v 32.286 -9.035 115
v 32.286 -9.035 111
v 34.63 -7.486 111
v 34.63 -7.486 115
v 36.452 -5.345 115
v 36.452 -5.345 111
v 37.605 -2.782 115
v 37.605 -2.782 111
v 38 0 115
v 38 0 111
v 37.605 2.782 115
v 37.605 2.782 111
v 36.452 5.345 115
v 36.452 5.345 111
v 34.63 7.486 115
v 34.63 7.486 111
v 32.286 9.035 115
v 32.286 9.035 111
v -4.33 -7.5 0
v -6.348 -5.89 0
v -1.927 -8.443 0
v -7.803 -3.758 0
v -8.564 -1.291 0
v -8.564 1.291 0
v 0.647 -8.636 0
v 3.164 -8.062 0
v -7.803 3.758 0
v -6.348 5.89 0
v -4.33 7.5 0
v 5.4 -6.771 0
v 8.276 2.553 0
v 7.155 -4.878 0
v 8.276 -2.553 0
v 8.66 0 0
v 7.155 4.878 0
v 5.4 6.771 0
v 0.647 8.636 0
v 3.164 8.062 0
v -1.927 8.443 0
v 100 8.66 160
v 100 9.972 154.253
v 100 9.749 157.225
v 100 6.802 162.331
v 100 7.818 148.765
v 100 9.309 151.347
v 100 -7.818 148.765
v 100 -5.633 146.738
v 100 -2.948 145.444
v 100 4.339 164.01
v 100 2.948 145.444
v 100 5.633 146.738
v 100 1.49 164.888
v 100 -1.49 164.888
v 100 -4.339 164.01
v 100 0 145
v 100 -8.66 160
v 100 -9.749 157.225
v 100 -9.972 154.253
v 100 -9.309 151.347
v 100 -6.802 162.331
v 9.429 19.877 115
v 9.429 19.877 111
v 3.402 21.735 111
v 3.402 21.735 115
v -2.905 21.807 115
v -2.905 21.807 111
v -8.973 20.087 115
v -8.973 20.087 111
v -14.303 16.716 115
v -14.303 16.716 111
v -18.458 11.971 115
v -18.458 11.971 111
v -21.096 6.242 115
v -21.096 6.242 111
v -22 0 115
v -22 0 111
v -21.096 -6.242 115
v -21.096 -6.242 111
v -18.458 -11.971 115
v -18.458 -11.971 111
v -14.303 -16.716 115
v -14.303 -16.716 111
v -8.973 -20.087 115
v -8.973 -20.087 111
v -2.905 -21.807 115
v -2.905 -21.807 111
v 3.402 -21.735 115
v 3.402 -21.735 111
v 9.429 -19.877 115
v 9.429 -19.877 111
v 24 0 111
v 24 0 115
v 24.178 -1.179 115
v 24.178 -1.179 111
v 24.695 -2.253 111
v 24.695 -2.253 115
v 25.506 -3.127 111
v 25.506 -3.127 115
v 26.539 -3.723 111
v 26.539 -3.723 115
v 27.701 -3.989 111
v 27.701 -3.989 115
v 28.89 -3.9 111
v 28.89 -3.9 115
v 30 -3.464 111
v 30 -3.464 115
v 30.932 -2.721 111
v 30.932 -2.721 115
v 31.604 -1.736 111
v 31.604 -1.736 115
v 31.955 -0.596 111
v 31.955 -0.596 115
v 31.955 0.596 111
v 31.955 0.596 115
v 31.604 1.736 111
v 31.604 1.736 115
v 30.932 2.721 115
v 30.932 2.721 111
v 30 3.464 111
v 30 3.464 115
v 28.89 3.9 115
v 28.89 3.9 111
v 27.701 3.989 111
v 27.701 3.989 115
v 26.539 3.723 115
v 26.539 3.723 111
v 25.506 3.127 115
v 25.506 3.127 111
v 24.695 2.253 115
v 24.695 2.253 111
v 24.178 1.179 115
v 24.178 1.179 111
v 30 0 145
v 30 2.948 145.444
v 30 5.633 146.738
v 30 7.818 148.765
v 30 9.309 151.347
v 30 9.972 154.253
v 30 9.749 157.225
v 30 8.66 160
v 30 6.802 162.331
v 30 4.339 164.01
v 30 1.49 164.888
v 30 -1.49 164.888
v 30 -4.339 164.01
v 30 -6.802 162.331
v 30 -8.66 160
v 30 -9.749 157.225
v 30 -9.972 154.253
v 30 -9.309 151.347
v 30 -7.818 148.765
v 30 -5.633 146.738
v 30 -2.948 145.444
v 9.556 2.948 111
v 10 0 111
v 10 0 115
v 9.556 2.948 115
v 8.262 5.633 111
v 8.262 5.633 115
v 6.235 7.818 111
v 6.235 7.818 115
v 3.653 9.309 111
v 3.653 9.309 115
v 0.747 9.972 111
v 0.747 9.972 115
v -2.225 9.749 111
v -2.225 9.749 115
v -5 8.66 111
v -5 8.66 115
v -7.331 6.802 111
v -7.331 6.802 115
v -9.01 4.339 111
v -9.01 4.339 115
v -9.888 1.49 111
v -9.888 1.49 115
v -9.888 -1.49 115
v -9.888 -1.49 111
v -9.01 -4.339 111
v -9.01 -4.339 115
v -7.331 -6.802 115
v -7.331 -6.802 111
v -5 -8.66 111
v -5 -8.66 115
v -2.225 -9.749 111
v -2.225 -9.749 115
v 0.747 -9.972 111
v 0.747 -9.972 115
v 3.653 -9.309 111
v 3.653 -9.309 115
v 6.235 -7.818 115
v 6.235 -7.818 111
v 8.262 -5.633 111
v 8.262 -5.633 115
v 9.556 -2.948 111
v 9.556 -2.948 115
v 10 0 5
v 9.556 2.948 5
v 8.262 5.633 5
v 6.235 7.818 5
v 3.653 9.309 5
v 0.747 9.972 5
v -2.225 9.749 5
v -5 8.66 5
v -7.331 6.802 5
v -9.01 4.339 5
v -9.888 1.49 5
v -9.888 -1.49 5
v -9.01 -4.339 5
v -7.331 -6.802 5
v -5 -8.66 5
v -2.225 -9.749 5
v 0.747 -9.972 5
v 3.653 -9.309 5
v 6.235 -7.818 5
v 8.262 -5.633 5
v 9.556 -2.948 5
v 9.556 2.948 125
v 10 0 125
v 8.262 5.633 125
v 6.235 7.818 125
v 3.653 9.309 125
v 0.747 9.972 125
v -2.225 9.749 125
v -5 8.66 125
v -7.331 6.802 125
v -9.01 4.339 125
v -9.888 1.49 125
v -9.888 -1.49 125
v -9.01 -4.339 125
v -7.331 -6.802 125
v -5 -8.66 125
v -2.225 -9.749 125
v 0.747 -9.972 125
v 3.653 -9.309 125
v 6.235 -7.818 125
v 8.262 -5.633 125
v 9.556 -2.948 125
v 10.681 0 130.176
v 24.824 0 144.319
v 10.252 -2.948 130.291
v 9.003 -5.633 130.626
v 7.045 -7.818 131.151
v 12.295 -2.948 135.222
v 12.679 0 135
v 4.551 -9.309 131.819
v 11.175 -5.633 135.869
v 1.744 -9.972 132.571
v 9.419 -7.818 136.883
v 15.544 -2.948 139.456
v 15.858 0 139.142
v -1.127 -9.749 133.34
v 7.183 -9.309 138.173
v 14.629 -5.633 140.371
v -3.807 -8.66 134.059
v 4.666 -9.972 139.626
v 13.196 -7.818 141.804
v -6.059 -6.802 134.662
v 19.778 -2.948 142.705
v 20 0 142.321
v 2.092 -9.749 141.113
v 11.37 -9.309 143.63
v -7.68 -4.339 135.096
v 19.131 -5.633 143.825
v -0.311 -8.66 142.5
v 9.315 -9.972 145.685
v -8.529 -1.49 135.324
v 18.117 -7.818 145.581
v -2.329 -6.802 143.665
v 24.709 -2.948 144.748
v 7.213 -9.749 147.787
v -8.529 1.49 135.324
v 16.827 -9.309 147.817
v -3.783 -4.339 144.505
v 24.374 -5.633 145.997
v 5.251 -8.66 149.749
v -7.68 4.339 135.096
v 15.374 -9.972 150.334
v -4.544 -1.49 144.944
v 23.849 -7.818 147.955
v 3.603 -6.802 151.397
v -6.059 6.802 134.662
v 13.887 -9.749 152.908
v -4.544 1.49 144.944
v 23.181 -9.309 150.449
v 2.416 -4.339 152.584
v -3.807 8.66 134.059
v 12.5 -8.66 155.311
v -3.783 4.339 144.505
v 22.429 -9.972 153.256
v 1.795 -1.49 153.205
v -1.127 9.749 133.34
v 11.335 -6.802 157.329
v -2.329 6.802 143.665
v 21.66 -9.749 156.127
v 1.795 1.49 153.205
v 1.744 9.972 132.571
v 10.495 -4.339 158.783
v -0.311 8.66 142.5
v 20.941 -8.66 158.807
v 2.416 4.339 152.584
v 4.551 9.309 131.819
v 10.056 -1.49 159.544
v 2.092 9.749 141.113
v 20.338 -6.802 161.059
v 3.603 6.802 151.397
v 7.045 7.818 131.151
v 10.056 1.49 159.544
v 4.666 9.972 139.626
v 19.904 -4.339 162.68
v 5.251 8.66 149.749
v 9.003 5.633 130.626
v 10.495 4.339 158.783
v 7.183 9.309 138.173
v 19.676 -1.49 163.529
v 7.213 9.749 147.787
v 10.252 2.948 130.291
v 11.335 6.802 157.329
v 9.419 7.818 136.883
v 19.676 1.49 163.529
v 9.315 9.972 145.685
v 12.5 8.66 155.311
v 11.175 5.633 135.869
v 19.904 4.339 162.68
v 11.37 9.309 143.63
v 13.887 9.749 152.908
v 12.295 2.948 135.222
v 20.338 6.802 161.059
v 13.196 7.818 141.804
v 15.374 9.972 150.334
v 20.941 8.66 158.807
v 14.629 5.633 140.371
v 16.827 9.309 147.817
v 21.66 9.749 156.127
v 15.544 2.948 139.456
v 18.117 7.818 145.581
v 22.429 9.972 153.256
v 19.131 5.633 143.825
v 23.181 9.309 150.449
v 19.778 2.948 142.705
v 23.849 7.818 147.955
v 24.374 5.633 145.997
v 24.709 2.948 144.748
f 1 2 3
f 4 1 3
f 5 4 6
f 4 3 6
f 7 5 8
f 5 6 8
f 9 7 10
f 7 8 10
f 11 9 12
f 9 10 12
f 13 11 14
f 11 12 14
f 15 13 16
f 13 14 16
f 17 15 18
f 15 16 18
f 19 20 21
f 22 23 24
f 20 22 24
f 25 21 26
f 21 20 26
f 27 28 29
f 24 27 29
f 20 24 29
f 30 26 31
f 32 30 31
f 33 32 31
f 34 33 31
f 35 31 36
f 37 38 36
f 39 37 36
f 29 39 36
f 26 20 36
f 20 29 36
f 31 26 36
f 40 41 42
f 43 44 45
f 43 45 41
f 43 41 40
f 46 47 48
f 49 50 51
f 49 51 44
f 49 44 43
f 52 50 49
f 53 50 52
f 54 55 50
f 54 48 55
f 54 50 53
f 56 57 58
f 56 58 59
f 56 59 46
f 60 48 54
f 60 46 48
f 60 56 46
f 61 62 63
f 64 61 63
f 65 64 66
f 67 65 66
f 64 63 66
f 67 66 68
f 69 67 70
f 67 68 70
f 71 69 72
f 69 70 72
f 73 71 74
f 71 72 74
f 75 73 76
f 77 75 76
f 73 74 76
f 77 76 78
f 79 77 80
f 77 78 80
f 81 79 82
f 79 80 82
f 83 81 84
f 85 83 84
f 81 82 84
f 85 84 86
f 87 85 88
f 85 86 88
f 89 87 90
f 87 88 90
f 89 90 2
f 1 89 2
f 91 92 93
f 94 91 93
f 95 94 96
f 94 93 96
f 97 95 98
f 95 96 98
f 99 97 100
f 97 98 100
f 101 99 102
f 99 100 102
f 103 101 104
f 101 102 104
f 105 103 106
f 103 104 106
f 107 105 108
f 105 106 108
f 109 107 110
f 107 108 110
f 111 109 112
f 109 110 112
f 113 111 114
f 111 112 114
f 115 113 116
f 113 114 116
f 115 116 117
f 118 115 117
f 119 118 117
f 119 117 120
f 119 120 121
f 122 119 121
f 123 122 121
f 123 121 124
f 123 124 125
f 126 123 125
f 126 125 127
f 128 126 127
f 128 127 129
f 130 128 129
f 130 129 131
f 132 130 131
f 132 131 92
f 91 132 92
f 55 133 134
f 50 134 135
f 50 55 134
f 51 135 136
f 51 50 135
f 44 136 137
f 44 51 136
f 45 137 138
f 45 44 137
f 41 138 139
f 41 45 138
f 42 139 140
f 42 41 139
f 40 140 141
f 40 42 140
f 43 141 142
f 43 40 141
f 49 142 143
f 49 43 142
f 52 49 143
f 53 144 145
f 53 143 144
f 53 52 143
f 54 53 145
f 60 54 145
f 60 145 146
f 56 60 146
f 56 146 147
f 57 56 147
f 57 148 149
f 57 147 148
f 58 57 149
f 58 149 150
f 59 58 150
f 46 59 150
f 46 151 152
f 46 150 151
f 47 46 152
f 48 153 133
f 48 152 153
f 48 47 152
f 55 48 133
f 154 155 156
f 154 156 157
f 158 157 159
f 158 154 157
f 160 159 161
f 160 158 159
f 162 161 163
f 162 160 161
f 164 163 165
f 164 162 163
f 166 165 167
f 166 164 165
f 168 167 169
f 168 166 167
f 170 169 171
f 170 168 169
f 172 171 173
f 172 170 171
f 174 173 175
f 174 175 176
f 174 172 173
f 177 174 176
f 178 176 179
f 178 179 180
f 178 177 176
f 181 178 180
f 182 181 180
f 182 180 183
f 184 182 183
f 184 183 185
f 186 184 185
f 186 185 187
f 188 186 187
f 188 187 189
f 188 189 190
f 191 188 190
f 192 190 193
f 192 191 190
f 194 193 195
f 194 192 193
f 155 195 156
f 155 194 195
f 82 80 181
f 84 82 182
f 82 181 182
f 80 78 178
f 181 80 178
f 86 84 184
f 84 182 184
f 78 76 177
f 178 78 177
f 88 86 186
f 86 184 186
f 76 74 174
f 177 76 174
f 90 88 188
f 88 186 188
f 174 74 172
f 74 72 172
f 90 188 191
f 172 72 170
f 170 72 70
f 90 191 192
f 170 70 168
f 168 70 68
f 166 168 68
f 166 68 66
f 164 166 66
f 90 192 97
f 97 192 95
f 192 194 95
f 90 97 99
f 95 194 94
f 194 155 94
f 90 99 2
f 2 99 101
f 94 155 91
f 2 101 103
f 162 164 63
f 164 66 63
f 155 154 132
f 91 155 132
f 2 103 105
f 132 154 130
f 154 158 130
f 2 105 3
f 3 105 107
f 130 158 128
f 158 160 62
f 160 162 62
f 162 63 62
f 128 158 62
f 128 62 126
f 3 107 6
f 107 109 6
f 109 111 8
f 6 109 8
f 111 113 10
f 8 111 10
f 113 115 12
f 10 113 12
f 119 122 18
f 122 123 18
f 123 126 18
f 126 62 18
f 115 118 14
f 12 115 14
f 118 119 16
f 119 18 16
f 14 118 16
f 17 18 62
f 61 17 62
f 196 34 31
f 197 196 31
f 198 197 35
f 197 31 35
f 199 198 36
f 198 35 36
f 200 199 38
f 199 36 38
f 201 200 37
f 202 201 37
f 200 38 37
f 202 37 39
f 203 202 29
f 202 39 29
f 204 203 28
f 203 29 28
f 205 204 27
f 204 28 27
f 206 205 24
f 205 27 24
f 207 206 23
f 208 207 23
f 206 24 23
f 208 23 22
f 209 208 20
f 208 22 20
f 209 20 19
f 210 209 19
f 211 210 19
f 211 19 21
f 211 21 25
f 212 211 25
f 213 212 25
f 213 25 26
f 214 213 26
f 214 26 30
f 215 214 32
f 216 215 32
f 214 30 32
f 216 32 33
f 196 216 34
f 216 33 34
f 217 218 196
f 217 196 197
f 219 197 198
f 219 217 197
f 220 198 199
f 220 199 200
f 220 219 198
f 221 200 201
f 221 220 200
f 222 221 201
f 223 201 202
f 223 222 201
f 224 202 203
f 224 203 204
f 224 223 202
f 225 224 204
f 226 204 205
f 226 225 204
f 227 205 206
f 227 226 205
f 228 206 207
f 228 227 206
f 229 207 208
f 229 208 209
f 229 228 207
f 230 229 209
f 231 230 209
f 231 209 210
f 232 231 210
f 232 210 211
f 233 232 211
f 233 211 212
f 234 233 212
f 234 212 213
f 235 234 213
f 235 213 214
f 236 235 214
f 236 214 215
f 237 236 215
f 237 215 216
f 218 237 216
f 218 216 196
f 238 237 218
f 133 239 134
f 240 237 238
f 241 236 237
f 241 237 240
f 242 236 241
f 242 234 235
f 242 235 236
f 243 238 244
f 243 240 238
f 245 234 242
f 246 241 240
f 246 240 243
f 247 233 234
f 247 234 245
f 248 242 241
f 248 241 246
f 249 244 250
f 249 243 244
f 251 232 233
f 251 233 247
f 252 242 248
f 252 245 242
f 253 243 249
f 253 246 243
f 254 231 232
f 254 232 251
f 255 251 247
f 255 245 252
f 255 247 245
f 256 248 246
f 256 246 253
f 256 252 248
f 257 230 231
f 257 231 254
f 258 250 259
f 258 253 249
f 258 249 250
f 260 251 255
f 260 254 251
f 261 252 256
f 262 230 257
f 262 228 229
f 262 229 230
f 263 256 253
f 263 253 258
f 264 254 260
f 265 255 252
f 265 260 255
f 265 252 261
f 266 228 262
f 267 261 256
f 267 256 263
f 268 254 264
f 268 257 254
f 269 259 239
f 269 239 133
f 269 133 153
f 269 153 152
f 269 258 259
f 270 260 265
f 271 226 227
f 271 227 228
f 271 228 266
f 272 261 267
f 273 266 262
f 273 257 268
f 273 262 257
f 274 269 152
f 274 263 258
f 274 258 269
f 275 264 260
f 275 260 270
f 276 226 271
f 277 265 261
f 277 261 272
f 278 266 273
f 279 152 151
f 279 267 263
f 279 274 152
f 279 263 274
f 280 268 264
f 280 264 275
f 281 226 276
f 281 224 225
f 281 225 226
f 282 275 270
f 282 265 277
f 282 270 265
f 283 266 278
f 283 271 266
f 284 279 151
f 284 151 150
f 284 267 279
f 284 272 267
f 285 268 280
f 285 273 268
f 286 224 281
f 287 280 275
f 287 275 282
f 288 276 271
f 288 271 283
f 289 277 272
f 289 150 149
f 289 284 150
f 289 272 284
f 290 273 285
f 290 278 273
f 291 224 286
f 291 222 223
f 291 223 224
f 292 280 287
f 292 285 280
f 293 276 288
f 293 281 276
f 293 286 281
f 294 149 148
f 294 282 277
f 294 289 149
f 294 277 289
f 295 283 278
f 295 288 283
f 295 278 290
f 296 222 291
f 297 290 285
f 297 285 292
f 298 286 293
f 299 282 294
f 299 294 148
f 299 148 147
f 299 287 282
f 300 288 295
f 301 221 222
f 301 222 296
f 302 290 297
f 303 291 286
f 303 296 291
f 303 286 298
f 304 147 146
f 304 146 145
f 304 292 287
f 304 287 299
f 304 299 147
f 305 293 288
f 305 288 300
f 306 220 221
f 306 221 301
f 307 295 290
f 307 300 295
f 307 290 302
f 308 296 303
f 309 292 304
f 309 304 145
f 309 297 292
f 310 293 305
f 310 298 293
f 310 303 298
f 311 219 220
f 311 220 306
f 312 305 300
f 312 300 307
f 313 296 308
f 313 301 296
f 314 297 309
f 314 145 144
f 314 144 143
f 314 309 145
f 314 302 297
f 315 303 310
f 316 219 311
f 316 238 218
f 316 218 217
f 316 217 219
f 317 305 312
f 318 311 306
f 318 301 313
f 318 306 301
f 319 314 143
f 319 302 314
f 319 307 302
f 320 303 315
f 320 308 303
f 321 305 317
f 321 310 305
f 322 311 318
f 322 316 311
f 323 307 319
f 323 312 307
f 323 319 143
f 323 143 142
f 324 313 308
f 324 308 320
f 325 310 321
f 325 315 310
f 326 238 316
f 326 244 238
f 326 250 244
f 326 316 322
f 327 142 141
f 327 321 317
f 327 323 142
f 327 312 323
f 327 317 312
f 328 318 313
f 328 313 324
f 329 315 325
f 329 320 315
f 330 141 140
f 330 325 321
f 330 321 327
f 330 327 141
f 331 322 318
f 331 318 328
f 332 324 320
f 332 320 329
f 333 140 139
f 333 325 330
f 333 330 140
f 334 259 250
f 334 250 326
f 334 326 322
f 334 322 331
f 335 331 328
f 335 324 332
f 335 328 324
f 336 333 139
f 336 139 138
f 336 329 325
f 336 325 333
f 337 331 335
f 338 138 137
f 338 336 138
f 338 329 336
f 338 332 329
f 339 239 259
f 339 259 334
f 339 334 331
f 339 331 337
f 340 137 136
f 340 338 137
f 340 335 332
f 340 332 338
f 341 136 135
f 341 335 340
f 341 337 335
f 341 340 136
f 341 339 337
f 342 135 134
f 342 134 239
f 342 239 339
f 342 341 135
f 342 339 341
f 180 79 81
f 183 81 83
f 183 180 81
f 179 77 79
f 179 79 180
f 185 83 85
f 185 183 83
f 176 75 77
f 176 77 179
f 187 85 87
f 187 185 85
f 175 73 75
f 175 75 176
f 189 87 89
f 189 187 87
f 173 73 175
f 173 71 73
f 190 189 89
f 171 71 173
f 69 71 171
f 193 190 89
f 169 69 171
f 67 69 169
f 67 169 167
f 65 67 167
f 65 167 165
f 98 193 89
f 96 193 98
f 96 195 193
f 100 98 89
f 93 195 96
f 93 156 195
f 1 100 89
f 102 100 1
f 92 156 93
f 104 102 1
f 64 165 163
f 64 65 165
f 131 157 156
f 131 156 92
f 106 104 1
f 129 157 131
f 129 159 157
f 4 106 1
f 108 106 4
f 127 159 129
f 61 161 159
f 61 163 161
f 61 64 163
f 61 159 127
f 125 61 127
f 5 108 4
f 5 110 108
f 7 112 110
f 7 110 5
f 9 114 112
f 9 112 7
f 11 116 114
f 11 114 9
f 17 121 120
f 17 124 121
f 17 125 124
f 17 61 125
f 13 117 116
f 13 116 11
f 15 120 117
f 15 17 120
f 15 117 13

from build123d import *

# Parameters (mm, degrees)
F1_R     = 10
F3_SIZE2 = 1.3397459622
F3_SIZE  = 5
F5_R     = 10
F6_DEPTH = 4
F7_D     = 8


with BuildPart() as f2:
    # F2: sweep along a path in F0
    with BuildLine(Plane.XZ) as f2_path:
        Line((0, 0), (0, 125))
        ThreePointArc((0, 125), (8.7867965644, 146.2132034356), (30, 155))
        Line((30, 155), (100, 155))
    # F1 (on Top) → F2 (sweep)
    with BuildSketch(Plane.XY):
        Circle(F1_R)
    sweep(path=f2_path.line)

    # F3
    f3_edges = [f2.edges().sort_by_distance(p)[0] for p in [
        (-10, 0, 0),
    ]]
    chamfer(f3_edges, length=F3_SIZE, length2=F3_SIZE2)


with BuildPart() as f6:
    # F5 (on offset) → F6 (new body)
    with BuildSketch(Plane.XY.offset(111)):
        with BuildLine():
            Line((32.2857142857, 9.0350790291), (9.4285714286, 19.8771738639))
            ThreePointArc((9.4285714286, 19.8771738639), (-22, 0), (9.4285714286, -19.8771738639))
            Line((9.4285714286, -19.8771738639), (32.2857142857, -9.0350790291))
            ThreePointArc((32.2857142857, -9.0350790291), (38, 0), (32.2857142857, 9.0350790291))
        make_face()
        Circle(F5_R, mode=Mode.SUBTRACT)
    extrude(amount=F6_DEPTH)

    # F7 (through all)
    with Locations(Plane(origin=(0, 0, 111), x_dir=(1, 0, 0), z_dir=(0, 0, -1))):
        with Locations((28, 0)):
            Hole(F7_D / 2)


solid = Compound([f2.part, f6.part])
